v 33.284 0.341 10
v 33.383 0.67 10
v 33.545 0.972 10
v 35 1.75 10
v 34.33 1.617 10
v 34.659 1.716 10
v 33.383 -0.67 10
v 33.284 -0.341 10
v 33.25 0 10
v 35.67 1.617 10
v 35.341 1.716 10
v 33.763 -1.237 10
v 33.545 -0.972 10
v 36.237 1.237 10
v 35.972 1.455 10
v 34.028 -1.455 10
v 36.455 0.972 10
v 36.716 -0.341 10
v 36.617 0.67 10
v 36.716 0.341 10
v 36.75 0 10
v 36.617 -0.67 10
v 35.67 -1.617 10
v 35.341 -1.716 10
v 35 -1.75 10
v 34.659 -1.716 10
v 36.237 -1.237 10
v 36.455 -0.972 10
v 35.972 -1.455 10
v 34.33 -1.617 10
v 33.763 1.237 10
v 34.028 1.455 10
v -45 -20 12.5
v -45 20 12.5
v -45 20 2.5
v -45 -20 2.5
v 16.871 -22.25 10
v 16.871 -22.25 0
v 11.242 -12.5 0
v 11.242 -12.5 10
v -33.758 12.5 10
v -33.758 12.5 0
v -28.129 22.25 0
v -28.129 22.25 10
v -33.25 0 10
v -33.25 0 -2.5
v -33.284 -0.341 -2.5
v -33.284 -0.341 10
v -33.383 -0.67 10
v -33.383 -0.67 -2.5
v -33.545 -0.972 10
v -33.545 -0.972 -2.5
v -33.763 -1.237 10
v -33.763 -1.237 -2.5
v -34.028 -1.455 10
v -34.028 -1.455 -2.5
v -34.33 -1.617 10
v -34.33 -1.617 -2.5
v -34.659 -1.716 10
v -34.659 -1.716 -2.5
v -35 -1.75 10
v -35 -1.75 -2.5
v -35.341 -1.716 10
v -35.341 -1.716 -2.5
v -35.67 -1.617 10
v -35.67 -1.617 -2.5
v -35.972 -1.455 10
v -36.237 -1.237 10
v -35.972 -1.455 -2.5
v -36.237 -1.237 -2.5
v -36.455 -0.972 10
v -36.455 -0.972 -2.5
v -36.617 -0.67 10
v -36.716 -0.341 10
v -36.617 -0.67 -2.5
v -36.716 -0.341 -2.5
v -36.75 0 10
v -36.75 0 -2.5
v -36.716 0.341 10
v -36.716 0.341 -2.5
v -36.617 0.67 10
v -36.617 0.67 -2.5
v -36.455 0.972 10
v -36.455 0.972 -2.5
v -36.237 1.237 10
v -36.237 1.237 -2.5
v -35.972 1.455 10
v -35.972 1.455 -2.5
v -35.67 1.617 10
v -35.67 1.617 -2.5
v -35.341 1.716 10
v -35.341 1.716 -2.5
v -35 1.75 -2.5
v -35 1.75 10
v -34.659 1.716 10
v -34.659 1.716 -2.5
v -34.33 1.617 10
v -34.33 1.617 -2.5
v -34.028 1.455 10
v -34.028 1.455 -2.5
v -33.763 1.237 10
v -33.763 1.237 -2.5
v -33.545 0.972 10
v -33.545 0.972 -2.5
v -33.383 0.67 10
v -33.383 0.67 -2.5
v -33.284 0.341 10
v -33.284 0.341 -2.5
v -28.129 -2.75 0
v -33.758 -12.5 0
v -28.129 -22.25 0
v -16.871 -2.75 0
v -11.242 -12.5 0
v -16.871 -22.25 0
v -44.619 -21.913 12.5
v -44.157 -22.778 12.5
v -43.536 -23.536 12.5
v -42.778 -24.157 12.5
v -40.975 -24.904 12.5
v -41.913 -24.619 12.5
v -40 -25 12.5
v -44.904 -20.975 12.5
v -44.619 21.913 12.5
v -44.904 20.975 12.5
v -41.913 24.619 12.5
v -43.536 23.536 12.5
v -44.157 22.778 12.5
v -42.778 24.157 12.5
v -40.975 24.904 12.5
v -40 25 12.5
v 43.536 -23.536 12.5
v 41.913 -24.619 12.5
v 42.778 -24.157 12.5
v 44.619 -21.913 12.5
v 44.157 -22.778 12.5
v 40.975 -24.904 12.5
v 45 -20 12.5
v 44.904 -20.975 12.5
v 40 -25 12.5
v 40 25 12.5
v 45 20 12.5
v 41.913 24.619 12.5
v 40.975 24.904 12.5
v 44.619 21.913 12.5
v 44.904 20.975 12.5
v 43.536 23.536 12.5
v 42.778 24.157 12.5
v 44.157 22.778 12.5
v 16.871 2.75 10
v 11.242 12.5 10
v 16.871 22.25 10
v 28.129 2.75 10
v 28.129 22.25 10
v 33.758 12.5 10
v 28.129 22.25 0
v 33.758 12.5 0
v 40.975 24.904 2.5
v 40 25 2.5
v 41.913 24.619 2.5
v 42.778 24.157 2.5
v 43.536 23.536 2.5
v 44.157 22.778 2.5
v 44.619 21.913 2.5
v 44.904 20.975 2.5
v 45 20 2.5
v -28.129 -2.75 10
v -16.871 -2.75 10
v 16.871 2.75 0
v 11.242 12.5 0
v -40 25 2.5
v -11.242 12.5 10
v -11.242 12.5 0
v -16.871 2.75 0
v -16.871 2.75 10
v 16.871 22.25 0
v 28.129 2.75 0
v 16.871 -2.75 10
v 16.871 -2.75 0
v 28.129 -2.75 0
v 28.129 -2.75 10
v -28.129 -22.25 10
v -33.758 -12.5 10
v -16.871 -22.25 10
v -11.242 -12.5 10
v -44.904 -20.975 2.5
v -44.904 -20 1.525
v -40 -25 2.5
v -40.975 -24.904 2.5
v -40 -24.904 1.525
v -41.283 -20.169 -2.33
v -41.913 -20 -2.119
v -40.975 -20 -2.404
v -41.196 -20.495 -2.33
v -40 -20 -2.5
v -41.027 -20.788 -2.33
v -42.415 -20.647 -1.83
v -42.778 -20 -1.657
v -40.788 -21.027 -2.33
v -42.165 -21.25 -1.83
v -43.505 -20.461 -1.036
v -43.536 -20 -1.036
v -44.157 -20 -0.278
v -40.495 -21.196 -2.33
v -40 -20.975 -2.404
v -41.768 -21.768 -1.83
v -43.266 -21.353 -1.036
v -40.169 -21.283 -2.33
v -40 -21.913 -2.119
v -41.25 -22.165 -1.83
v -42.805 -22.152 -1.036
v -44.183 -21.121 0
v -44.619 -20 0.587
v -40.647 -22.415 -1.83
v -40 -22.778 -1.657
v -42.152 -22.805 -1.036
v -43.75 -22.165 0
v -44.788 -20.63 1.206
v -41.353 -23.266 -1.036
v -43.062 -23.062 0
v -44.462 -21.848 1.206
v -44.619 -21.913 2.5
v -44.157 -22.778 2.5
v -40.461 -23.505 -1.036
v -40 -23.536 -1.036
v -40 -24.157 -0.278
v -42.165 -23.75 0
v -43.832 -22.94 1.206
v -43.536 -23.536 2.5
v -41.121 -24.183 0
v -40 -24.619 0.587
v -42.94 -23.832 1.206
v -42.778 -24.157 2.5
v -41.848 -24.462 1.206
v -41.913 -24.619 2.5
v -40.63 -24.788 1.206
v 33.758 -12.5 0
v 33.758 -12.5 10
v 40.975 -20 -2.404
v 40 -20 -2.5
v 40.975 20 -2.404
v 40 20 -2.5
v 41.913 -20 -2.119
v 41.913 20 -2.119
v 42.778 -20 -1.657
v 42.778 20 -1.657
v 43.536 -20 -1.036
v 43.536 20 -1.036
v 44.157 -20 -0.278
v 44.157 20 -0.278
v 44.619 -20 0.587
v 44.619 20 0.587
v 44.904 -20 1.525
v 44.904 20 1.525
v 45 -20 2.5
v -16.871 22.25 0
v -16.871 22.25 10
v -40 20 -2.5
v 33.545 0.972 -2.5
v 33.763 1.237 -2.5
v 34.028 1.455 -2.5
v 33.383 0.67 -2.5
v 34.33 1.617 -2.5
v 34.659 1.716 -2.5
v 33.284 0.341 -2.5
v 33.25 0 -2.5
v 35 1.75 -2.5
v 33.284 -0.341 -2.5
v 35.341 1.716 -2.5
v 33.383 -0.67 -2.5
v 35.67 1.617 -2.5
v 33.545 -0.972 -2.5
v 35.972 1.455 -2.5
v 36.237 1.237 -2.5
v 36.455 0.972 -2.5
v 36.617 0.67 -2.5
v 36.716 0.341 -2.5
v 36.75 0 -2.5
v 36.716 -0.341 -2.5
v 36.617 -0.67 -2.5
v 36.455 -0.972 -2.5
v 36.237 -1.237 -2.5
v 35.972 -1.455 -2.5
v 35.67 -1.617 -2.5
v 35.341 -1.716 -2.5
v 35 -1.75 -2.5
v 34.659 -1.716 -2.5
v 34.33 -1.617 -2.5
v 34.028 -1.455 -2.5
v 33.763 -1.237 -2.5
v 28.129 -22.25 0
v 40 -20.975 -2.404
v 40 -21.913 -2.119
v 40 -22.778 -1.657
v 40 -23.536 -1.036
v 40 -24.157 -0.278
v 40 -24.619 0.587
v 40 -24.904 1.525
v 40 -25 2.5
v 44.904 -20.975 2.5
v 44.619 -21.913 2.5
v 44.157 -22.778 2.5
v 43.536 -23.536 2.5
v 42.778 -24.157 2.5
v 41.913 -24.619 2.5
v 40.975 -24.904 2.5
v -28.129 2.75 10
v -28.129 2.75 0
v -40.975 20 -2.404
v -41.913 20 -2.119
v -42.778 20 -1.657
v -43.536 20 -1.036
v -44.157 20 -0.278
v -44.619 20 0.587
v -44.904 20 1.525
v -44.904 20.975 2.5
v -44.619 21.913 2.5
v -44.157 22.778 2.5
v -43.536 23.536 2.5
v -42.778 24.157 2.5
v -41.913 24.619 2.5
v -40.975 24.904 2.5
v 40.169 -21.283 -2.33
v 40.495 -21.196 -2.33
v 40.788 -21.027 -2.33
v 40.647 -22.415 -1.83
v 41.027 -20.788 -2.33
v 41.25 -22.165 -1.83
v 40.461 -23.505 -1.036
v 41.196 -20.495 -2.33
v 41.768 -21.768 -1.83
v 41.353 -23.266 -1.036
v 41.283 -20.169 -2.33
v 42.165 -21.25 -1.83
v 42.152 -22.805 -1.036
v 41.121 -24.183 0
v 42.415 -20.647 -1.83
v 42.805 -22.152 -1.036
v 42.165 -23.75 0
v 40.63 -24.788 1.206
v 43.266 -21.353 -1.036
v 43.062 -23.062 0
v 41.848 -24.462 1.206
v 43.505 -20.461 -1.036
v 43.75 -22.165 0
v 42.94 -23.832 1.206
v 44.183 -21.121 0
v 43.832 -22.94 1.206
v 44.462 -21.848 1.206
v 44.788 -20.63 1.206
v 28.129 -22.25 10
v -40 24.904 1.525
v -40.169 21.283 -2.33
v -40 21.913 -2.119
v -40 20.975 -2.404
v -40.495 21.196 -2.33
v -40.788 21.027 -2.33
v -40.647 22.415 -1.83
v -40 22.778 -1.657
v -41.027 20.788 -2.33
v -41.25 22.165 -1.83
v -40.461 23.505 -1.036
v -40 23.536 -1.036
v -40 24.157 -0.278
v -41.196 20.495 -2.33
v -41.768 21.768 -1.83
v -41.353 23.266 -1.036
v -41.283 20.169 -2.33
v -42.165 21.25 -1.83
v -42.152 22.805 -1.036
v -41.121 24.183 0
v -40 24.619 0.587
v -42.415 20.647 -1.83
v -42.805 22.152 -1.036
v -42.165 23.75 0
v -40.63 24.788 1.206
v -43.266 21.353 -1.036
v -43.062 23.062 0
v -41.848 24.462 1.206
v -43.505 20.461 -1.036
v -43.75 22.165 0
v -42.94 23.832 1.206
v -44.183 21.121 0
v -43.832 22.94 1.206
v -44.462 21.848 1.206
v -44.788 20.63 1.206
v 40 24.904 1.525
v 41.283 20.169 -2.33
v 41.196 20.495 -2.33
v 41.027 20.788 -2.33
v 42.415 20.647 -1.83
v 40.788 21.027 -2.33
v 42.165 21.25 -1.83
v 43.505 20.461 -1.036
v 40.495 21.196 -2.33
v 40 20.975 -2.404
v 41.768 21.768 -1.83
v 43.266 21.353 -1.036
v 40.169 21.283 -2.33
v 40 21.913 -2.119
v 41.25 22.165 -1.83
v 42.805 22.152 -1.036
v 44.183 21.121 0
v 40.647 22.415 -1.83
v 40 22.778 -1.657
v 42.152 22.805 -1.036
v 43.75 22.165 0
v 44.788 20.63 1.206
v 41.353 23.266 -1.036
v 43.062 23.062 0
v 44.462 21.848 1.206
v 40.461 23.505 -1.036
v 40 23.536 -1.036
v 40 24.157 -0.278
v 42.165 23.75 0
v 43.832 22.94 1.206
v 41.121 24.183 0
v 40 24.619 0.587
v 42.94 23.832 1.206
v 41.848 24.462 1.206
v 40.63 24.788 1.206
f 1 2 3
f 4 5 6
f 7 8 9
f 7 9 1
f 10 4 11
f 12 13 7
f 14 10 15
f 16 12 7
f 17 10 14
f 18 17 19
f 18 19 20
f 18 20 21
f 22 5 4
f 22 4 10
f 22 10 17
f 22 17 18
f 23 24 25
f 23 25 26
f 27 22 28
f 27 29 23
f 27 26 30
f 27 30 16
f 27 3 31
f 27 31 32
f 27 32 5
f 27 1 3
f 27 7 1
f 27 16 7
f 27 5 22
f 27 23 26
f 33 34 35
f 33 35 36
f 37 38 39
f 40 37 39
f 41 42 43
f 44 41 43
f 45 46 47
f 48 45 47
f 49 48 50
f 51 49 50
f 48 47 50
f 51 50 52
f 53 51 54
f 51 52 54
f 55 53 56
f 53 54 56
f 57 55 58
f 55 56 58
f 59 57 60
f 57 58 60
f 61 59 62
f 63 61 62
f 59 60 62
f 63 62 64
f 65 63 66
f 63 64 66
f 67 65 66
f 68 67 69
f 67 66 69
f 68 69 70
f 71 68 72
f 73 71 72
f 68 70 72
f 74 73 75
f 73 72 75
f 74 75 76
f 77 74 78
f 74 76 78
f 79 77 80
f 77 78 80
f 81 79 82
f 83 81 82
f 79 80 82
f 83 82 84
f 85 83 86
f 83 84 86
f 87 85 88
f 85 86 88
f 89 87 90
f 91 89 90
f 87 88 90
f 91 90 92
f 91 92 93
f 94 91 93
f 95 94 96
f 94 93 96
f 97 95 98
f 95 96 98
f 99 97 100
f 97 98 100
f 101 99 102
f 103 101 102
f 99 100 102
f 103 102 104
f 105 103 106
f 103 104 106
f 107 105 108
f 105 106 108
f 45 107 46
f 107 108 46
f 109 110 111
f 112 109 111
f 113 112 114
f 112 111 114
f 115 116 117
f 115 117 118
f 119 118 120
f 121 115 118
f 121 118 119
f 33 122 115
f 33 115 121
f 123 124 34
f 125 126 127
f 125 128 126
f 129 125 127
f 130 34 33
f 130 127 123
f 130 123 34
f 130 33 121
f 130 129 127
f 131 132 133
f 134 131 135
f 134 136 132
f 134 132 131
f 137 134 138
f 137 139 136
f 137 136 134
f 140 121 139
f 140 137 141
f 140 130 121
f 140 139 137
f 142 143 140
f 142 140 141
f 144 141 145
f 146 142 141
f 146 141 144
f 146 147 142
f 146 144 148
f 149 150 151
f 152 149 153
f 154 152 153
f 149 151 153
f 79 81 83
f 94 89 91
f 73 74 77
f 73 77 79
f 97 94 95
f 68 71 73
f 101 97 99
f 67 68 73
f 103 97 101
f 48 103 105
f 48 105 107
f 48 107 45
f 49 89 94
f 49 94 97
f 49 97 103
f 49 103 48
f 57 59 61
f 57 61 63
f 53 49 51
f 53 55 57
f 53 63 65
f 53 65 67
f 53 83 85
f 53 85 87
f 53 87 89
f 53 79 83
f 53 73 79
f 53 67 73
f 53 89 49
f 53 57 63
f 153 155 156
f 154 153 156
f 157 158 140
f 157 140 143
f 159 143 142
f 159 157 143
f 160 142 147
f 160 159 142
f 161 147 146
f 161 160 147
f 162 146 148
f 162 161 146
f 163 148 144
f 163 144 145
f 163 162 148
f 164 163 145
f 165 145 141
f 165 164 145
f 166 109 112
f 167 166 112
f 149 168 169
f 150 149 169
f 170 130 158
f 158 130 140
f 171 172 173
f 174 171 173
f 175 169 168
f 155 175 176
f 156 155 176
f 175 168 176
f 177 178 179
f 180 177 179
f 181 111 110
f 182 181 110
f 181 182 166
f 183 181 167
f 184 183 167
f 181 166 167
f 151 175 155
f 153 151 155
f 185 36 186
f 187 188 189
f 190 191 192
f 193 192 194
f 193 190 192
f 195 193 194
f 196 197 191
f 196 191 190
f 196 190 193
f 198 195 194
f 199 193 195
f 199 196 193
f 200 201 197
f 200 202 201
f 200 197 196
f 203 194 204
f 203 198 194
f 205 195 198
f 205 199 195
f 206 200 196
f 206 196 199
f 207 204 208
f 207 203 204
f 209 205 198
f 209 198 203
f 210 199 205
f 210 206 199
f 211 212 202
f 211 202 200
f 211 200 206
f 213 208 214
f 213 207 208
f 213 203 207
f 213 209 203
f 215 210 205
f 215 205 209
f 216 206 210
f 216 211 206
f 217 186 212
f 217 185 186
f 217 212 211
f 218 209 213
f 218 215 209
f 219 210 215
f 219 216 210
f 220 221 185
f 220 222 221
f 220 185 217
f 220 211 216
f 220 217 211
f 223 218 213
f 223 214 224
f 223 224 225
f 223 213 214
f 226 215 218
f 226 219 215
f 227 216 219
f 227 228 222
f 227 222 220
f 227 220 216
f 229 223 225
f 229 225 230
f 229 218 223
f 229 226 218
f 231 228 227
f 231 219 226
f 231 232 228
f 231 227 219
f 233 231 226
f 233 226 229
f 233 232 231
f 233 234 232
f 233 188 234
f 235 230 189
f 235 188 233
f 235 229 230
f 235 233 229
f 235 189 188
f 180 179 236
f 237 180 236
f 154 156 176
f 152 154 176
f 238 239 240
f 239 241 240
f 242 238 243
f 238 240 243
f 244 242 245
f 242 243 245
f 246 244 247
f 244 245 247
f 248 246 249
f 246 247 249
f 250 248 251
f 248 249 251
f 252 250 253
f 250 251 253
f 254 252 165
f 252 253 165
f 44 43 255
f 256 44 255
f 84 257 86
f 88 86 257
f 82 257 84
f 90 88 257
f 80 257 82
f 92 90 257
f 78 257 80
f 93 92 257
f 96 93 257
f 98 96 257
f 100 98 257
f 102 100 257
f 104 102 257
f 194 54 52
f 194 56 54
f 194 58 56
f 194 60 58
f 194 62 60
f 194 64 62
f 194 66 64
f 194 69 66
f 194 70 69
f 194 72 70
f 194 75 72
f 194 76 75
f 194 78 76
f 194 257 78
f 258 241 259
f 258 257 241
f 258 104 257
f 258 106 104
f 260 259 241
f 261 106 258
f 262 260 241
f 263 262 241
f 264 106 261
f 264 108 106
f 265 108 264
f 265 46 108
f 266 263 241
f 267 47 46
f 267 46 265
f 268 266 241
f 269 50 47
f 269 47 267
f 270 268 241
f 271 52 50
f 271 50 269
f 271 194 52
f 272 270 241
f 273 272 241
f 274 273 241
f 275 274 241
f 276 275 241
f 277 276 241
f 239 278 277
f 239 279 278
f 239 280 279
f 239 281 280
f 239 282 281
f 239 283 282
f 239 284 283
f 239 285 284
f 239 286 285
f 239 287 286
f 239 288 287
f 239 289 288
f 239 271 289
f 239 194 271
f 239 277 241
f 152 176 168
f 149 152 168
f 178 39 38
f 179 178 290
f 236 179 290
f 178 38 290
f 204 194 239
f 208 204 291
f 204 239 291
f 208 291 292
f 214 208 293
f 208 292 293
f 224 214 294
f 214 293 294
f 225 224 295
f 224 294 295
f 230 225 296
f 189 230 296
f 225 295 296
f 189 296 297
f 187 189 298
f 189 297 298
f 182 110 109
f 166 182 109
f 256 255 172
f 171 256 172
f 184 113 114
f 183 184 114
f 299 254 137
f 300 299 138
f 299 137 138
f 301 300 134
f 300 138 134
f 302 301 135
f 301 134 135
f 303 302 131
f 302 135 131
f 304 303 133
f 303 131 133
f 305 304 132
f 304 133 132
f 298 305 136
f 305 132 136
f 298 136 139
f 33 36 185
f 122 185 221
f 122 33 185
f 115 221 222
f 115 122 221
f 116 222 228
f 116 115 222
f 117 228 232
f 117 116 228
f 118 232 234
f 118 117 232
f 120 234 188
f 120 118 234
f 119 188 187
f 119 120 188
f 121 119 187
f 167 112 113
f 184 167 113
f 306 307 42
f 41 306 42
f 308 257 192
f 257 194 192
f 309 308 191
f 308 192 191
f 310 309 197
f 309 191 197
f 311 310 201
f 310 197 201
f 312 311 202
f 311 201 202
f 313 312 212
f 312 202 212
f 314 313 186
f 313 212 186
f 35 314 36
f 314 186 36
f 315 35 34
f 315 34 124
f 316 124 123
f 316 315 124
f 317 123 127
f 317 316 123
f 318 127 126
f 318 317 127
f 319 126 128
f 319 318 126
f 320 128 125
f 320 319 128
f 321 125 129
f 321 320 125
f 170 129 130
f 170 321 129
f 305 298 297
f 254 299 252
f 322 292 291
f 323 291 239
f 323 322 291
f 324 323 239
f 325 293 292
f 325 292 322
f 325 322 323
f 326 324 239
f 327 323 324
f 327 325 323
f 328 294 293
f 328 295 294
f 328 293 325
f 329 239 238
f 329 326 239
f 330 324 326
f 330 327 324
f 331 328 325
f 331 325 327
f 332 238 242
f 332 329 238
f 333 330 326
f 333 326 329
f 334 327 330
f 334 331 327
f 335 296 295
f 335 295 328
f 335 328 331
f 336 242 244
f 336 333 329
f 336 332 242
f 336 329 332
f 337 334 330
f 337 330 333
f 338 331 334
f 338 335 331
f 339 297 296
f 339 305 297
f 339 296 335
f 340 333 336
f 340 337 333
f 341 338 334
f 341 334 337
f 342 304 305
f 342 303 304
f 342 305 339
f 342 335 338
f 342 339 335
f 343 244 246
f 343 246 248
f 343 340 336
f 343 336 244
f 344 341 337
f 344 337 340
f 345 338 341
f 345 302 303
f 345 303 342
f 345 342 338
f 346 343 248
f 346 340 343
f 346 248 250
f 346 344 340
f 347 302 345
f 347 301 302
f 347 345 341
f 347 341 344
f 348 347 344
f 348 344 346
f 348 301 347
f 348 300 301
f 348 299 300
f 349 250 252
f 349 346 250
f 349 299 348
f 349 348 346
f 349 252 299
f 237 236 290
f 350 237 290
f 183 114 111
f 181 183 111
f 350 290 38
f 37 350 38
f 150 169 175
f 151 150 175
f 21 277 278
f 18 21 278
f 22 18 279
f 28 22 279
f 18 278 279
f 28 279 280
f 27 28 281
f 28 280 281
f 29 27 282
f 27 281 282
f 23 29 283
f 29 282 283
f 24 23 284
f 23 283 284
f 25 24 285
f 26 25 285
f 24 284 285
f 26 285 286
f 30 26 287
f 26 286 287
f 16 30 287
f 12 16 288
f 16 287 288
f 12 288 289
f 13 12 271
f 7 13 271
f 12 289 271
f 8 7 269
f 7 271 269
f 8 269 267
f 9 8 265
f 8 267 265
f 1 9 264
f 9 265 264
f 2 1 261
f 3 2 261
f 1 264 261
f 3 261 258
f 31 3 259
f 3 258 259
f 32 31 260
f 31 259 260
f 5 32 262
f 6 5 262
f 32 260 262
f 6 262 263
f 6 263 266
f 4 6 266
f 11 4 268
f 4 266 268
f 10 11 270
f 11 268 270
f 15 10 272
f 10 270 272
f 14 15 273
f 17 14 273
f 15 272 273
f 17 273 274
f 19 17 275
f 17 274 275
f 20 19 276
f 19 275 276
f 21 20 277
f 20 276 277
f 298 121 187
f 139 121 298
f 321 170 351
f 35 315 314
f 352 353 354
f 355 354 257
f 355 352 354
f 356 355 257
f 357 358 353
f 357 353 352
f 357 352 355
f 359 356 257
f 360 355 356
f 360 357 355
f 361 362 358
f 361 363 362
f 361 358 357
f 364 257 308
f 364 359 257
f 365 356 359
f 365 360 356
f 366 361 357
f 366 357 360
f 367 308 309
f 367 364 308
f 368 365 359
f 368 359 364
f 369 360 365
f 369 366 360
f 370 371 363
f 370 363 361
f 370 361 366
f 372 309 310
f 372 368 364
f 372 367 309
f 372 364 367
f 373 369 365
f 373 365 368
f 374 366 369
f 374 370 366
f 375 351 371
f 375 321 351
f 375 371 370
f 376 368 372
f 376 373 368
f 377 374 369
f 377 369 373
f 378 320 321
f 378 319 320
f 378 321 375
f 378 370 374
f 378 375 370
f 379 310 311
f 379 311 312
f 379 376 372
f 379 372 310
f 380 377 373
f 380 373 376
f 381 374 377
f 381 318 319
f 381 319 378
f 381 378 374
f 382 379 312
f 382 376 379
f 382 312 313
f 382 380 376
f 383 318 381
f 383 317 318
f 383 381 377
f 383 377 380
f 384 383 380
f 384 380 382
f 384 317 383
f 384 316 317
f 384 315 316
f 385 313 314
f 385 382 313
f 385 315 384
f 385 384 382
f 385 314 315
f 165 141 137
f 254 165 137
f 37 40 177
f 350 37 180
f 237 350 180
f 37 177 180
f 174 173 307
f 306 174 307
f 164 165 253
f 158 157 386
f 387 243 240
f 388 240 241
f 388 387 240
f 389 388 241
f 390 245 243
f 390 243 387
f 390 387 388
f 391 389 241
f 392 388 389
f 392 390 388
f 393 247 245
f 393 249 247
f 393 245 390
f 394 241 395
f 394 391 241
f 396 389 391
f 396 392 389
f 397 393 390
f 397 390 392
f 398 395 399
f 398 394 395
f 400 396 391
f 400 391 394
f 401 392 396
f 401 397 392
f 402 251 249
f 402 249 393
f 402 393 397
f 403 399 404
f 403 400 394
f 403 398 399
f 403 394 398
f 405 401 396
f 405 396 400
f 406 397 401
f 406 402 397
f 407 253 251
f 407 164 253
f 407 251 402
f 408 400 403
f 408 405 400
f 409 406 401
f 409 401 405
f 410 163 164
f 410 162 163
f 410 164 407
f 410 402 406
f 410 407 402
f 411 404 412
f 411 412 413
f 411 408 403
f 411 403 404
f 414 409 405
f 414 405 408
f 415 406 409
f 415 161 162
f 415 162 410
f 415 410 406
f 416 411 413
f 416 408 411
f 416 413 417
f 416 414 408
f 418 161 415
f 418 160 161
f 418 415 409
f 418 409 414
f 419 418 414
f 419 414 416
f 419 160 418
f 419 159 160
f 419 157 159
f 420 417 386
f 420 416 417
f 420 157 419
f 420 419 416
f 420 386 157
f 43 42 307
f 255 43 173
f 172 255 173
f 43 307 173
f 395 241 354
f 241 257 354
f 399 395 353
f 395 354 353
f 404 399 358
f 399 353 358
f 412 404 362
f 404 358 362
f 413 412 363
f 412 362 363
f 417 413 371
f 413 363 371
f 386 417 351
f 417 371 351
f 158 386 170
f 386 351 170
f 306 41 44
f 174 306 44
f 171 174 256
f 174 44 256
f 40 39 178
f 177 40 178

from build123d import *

# Parameters (mm, degrees)
F0_W     = 90
F0_H     = 50
F1_DEPTH = 10
F2_W     = 90
F2_H     = 50
F3_DEPTH = 2.5
F4_W     = 90
F4_H     = 50
F5_DEPTH = 2.5
F6_R     = 5
F7_R     = 5
F9_DEPTH = 12.5


with BuildPart() as f1:
    # F0 (on Top) → F1 (new body)
    with BuildSketch(Plane.XY):
        Rectangle(F0_W, F0_H)
        Polygon((-28.1291651246, -2.75), (-16.8708348754, -2.75), (-11.2416697508, -12.5), (-16.8708348754, -22.25), (-28.1291651246, -22.25), (-33.7583302492, -12.5), align=None, mode=Mode.SUBTRACT)
        Polygon((16.8708348754, -2.75), (28.1291651246, -2.75), (33.7583302492, -12.5), (28.1291651246, -22.25), (16.8708348754, -22.25), (11.2416697508, -12.5), align=None, mode=Mode.SUBTRACT)
        Polygon((-28.1291651246, 22.25), (-16.8708348754, 22.25), (-11.2416697508, 12.5), (-16.8708348754, 2.75), (-28.1291651246, 2.75), (-33.7583302492, 12.5), align=None, mode=Mode.SUBTRACT)
        Polygon((11.2416697508, 12.5), (16.8708348754, 22.25), (28.1291651246, 22.25), (33.7583302492, 12.5), (28.1291651246, 2.75), (16.8708348754, 2.75), align=None, mode=Mode.SUBTRACT)
    extrude(amount=F1_DEPTH)

    # F2 (on face) → F3 (join)
    with BuildSketch(Plane.XY.offset(10)):
        Rectangle(F2_W, F2_H)
    extrude(amount=F3_DEPTH)

    # F4 (on face) → F5 (join)
    with BuildSketch(Plane(origin=(0, 0, 0), x_dir=(1, 0, 0), z_dir=(0, 0, -1))):
        Rectangle(F4_W, F4_H)
    extrude(amount=F5_DEPTH)

    # F6
    f6_edges = [f1.edges().sort_by_distance(p)[0] for p in [
        (-45, 25, 5),
        (45, 25, 5),
        (45, -25, 5),
        (-45, -25, 5),
    ]]
    fillet(f6_edges, radius=F6_R)

    # F7
    f7_edges = [f1.edges().sort_by_distance(p)[0] for p in [
        (0, -25, -2.5),
        (43.535534, -23.535534, -2.5),
        (45, 0, -2.5),
        (43.535534, 23.535534, -2.5),
        (0, 25, -2.5),
        (-45, 0, -2.5),
        (-43.535534, 23.535534, -2.5),
        (-43.535534, -23.535534, -2.5),
    ]]
    fillet(f7_edges, radius=F7_R)

    # F8 (on face) → F9 (cut)
    with BuildSketch(Plane(origin=(0, 0, -2.5), x_dir=(1, 0, 0), z_dir=(0, 0, -1))):
        with BuildLine():
            Line((-33.25, 0), (-35, 0))
            Line((-35, 0), (-36.75, 0))
            ThreePointArc((-36.75, 0), (-35, -1.75), (-33.25, 0))
        make_face()
        with BuildLine():
            Line((-36.75, 0), (-35, 0))
            Line((-35, 0), (-33.25, 0))
            ThreePointArc((-33.25, 0), (-35, 1.75), (-36.75, 0))
        make_face()
        with BuildLine():
            Line((35, 0), (33.25, 0))
            ThreePointArc((33.25, 0), (35, -1.75), (36.75, 0))
            Line((36.75, 0), (35, 0))
        make_face()
        with BuildLine():
            ThreePointArc((36.75, 0), (35, 1.75), (33.25, 0))
            Line((33.25, 0), (35, 0))
            Line((35, 0), (36.75, 0))
        make_face()
    extrude(amount=-F9_DEPTH, mode=Mode.SUBTRACT)


solid = f1.part
